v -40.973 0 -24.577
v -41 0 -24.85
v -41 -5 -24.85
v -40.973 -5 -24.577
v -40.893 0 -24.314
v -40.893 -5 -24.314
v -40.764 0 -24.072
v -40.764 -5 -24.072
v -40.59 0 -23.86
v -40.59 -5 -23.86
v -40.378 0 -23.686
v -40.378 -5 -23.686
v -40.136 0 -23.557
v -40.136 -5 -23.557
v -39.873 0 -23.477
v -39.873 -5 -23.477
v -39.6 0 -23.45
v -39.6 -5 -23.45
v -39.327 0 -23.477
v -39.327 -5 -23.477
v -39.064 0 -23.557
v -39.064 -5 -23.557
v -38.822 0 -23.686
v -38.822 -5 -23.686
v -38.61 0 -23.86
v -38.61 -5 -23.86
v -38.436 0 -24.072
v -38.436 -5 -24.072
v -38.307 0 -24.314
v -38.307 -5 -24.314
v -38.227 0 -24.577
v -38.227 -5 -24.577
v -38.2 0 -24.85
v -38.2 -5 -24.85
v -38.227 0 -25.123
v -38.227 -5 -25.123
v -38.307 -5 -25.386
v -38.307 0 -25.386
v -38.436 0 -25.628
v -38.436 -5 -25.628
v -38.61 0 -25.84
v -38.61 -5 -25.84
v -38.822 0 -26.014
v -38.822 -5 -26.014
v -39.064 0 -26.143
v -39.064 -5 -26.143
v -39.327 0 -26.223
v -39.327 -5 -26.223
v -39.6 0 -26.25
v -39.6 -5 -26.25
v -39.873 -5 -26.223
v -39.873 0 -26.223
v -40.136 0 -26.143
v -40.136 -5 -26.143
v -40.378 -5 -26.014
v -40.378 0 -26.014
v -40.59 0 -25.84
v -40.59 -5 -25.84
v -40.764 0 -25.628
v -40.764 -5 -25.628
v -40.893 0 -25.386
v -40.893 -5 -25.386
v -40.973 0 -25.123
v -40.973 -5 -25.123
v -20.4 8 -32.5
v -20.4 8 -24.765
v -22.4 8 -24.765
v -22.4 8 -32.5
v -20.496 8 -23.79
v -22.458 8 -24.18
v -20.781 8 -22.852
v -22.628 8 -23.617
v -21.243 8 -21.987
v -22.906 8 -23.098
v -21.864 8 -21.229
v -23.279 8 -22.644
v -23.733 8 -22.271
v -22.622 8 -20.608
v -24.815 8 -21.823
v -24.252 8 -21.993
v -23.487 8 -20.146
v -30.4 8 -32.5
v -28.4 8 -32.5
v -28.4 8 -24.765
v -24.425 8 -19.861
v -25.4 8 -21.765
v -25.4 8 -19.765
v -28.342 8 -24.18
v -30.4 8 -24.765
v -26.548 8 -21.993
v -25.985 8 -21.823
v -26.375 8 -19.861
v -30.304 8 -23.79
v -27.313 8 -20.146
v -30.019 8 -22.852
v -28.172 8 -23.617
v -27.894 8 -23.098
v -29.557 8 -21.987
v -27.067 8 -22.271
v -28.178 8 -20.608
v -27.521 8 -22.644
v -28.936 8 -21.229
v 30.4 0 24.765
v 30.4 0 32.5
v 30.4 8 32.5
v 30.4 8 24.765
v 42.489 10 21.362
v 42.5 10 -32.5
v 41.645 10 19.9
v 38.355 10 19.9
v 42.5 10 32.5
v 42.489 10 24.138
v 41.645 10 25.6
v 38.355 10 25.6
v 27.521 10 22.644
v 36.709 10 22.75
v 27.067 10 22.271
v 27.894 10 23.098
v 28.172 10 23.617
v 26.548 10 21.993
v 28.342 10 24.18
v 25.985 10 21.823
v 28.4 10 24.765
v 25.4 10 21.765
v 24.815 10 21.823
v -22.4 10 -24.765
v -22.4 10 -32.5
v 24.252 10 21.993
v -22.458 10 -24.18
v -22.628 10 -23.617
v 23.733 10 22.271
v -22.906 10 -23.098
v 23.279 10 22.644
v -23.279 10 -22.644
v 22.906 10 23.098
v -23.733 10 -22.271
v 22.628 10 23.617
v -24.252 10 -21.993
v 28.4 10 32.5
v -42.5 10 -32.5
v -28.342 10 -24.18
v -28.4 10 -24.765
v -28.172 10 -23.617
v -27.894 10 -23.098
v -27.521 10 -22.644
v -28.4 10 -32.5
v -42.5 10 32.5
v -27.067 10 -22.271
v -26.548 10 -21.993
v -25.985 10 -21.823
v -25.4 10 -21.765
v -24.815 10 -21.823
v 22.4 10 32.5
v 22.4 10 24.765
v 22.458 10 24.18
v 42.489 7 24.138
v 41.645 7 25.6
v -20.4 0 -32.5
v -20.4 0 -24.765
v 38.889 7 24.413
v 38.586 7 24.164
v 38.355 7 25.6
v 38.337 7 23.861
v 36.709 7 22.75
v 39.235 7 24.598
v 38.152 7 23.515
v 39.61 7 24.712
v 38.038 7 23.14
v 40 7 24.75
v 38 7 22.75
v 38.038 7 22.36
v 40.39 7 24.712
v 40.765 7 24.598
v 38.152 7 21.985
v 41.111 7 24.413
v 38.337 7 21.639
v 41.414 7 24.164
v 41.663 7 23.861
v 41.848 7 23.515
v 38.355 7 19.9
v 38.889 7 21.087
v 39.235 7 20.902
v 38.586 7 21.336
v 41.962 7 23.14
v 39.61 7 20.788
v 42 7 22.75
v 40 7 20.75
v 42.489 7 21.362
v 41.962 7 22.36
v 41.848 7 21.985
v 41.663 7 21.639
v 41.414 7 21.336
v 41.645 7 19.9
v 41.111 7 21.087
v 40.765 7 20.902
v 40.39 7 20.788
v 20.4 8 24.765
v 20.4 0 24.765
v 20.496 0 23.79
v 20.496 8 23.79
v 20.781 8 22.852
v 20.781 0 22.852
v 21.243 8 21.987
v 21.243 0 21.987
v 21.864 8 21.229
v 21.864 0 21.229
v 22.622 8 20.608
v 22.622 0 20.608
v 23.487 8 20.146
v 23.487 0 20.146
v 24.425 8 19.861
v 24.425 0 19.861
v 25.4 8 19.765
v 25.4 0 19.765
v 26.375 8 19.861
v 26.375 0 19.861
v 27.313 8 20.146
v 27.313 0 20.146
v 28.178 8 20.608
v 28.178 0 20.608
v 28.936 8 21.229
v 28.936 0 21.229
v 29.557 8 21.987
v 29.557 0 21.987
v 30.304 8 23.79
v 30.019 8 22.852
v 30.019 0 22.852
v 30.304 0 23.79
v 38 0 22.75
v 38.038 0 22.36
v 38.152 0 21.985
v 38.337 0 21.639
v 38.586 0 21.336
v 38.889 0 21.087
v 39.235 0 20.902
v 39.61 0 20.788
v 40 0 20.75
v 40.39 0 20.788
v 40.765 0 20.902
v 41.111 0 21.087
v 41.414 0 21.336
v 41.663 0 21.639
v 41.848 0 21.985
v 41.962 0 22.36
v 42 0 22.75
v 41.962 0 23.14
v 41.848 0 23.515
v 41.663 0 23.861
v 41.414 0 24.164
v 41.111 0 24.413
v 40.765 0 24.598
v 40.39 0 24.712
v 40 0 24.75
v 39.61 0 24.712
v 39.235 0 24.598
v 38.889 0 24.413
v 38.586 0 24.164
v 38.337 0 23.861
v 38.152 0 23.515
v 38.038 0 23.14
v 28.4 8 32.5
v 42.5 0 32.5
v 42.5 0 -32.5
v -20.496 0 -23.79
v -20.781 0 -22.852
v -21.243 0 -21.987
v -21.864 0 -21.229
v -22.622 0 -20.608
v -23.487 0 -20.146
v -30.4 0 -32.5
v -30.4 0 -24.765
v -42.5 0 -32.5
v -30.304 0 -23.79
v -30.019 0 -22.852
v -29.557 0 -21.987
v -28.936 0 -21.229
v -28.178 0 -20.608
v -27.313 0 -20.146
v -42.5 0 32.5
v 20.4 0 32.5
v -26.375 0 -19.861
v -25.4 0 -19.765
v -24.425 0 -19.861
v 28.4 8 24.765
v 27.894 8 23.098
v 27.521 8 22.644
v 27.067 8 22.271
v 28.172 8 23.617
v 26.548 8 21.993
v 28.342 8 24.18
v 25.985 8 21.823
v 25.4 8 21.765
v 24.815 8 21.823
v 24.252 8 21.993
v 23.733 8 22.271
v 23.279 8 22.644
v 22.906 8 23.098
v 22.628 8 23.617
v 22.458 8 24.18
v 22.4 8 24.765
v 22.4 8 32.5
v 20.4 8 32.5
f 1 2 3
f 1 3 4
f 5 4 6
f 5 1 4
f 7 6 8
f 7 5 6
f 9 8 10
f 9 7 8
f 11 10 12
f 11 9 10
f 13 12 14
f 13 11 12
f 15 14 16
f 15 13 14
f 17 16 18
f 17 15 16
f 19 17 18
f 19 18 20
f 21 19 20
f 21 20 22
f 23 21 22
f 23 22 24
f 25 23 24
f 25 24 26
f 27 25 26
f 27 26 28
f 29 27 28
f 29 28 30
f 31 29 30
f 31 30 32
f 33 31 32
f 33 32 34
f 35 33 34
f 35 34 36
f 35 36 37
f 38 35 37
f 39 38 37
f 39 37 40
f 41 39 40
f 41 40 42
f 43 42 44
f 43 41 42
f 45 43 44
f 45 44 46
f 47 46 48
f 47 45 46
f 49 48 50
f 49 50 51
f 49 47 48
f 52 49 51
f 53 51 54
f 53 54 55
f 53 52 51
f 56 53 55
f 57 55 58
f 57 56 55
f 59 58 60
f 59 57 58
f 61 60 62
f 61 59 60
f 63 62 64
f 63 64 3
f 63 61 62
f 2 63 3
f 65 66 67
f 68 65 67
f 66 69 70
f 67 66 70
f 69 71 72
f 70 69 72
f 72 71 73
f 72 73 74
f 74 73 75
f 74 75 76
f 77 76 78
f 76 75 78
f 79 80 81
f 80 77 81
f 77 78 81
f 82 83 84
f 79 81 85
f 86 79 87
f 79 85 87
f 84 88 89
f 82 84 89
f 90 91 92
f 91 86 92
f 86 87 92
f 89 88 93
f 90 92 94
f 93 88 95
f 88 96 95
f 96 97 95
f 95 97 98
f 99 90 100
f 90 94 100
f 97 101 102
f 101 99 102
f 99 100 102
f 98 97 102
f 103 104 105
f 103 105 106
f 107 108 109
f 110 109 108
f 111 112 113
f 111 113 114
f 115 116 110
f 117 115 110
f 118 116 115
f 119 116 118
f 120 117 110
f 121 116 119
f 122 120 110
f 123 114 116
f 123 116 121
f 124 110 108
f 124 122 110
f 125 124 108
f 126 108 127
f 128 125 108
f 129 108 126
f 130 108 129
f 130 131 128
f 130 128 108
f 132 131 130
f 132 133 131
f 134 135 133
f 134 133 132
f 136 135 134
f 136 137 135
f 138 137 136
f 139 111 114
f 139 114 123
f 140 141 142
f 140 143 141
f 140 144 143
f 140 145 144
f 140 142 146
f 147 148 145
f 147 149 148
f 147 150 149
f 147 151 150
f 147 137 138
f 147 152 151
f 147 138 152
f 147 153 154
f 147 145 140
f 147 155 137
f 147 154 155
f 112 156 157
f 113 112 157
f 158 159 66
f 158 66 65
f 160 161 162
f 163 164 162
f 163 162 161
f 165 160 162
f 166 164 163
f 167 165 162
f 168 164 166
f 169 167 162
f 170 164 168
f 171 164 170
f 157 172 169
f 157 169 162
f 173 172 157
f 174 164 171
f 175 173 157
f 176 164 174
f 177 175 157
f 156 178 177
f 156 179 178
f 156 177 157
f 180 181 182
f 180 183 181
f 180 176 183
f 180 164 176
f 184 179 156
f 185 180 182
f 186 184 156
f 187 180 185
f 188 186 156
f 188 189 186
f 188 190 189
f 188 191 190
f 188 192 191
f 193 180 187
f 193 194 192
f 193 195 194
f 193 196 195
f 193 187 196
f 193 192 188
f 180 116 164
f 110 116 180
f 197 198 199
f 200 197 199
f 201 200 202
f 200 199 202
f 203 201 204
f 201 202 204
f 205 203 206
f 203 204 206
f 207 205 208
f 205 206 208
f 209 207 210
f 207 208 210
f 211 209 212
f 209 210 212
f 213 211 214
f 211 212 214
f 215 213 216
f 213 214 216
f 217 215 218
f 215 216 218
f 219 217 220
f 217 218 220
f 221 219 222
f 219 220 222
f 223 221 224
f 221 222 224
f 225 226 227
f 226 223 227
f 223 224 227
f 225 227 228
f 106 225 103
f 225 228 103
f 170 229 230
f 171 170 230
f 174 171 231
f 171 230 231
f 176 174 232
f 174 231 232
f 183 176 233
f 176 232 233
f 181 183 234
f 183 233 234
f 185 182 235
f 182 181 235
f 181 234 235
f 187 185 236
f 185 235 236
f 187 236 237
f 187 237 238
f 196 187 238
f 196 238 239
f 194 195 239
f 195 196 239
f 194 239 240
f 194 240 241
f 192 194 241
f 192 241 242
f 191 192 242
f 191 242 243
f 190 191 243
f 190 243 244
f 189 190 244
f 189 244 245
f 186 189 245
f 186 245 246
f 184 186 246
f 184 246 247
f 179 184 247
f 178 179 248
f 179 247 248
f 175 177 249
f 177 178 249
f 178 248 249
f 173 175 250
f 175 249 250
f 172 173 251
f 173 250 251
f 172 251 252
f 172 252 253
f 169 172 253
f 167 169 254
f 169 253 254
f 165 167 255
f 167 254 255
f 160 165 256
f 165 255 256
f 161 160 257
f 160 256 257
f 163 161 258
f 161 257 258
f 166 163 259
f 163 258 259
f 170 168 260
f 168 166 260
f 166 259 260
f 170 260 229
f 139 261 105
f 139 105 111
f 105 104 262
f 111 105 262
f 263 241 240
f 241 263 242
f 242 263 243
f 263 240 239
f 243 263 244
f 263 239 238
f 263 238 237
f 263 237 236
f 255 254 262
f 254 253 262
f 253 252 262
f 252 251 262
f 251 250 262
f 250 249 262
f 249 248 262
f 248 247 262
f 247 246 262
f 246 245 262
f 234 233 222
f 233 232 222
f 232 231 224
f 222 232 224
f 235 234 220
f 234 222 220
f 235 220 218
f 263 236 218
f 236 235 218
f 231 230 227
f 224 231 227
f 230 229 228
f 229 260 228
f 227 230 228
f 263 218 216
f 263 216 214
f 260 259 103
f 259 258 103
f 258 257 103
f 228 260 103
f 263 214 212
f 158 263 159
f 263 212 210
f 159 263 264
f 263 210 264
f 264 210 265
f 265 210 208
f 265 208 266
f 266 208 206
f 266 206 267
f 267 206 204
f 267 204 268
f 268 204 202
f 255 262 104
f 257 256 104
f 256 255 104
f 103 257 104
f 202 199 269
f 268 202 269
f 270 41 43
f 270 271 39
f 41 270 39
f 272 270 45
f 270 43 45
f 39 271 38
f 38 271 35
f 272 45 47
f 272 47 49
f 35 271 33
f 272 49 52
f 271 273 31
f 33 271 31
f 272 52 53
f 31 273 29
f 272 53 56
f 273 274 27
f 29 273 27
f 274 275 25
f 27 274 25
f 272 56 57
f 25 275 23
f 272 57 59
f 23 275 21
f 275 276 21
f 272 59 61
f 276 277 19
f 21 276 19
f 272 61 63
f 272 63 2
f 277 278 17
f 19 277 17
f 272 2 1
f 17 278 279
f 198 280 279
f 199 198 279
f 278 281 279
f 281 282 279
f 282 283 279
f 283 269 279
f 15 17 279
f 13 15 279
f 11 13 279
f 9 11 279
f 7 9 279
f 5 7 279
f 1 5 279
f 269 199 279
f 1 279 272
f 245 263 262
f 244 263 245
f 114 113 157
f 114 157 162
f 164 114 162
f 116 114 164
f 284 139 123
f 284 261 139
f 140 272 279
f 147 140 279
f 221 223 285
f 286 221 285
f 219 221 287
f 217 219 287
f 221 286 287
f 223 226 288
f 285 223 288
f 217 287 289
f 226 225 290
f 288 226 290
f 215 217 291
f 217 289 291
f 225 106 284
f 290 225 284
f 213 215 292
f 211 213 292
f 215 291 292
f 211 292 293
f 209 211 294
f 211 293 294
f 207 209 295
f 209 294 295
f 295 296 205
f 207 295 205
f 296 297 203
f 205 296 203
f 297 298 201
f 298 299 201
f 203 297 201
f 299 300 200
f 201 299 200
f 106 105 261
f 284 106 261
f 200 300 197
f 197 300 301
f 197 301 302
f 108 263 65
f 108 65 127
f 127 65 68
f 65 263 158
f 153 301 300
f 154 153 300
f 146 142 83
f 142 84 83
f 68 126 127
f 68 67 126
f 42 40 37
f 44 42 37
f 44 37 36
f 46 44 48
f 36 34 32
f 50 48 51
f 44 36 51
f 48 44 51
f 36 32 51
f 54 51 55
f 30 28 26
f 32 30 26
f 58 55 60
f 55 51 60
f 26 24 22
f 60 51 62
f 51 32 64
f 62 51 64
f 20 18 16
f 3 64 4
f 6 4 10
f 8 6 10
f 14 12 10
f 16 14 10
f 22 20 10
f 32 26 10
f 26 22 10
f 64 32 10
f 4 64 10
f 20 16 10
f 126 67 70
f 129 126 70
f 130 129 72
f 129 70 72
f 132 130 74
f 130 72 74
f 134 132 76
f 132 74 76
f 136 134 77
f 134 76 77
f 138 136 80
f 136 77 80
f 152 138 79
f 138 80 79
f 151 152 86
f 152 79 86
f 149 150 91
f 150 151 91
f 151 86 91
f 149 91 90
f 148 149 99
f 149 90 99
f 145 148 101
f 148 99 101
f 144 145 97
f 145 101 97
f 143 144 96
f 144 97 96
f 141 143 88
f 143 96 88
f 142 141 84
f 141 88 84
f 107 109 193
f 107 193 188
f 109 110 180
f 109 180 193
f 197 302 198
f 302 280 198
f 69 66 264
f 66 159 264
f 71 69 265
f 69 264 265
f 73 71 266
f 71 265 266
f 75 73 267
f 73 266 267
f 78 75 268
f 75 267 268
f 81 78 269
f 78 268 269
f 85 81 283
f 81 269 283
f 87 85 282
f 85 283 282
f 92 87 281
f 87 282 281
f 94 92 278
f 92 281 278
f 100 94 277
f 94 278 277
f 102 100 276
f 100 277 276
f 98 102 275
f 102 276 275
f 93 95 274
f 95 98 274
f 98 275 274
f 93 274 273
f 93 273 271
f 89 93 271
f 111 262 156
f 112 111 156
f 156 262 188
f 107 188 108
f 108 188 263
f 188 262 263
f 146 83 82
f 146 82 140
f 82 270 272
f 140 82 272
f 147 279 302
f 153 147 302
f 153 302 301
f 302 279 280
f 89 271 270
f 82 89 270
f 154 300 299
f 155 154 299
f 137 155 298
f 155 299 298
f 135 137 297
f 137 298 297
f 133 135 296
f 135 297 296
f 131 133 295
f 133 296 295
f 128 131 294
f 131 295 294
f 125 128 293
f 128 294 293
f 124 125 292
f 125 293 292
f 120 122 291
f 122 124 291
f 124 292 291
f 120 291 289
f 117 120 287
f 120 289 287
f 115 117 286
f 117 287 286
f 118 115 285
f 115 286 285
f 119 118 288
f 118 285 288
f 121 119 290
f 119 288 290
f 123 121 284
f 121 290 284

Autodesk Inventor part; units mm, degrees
ref_plane "YZ Plane" through (0, 0, 0) normal (1, 0, 0) x (0, 1, 0)
ref_plane "XZ Plane" through (0, 0, 0) normal (0, 1, 0) x (-1, 0, 0)
ref_plane "XY Plane" through (0, 0, 0) normal (0, 0, 1) x (1, 0, 0)
sketch "Sketch1" plane through (0, 0, 0) normal (0, 1, 0) x (-1, 0, 0)
  line L0 (42.5, -32.5) -> (42.5, 32.5)
  line L1 (-42.5, 32.5) -> (-42.5, -32.5)
  line L2 (-42.5, -32.5) -> (42.5, 32.5) construction
  line L3 (42.5, -32.5) -> (-42.5, 32.5) construction
  line L4 (-25.4, -24.765) -> (25.4, -24.765) construction
  line L5 (25.4, -24.765) -> (25.4, 24.765) construction
  line L6 (25.4, 24.765) -> (-25.4, 24.765) construction
  line L7 (-25.4, 24.765) -> (-25.4, -24.765) construction
  line L8 (-25.4, -24.765) -> (25.4, 24.765) construction
  line L9 (25.4, -24.765) -> (-25.4, 24.765) construction
  arc A0 (-28.4, 24.765) -> (-22.4, 24.765) centre (-25.4, 24.765) ccw
  arc A1 (-30.4, 24.765) -> (-20.4, 24.765) centre (-25.4, 24.765) ccw
  arc A2 (28.4, -24.765) -> (22.4, -24.765) centre (25.4, -24.765) ccw
  arc A3 (30.4, -24.765) -> (20.4, -24.765) centre (25.4, -24.765) ccw
  line L10 (-20.4, 32.5) -> (-20.4, 24.765)
  line L11 (-30.4, 32.5) -> (-30.4, 24.765)
  line L12 (-28.4, 32.5) -> (-28.4, 24.765)
  line L13 (-22.4, 32.5) -> (-22.4, 24.765)
  line L14 (30.4, -24.765) -> (30.4, -32.5)
  line L15 (28.4, -24.765) -> (28.4, -32.5)
  line L16 (22.4, -24.765) -> (22.4, -32.5)
  line L17 (20.4, -24.765) -> (20.4, -32.5)
  line L18 (-42.5, -32.5) -> (22.4, -32.5)
  line L19 (28.4, -32.5) -> (42.5, -32.5)
  line L20 (42.5, 32.5) -> (-22.4, 32.5)
  line L21 (-28.4, 32.5) -> (-42.5, 32.5)
  point P0 (0, 0)
  dimension "d2" = 50.8
  dimension "d3" = 49.53
  dimension "d4" = 6
  dimension "d5" = 10
sketch "Sketch2" plane through (0, 0, 0) normal (0, 1, 0) x (-1, 0, 0)
  line L0 (-43, -29.25) -> (43, -29.25)
  line L1 (43, -29.25) -> (43, 29.25)
  line L2 (43, 29.25) -> (-43, 29.25)
  line L3 (-43, 29.25) -> (-43, -29.25)
  line L4 (-43, -29.25) -> (43, 29.25) construction
  line L5 (43, -29.25) -> (-43, 29.25) construction
  circle A0 centre (39.6, -24.85) radius 1.4
  line L6 (41, -24.85) -> (39.6, -24.85)
  line L7 (39.6, -24.85) -> (39.6, -26.25)
  circle A1 centre (-40, 22.75) radius 2
  line L8 (-38, 22.75) -> (-43, 22.75) construction
  line L9 (-40, 24.75) -> (-40, 29.25) construction
  line L10 (-40, 24.75) -> (-40, 22.75) construction
  point P0 (0, 0)
  dimension "d6" = 86
  dimension "d7" = 58.5
  dimension "d8" = 2.8
  dimension "d9" = 3
  dimension "d10" = 2
  dimension "d11" = 4
  dimension "d12" = 5
  dimension "d13" = 4.5
extrude "Extrusion1" add sketch "Sketch1" along normal blind 10
extrude "Extrusion2" cut sketch "Sketch1" along normal blind 8 contours L19 L15 A2 L16 L18 L17 A3 L14 | L10 A1 L11 L21 L12 A0 L13 L20
extrude "Extrusion3" add sketch "Sketch2" against normal blind 5 contours L6 L7 A0 | A0 L7 L6
extrude "Extrusion4" cut sketch "Sketch2" along normal through all contours A1
sketch "Sketch3" plane through (0, 10, 0) normal (0, 1, 0) x (1, 0, 0)
  circle A0 centre (40, -22.75) radius 2 projected
  arc A1 (-28.4, 24.765) -> (-22.4, 24.765) centre (-25.4, 24.765) ccw projected
  line L0 (-28.4, 24.765) -> (-28.4, 32.5) projected
  line L1 (-28.4, 32.5) -> (-42.5, 32.5) projected
  line L2 (-42.5, 32.5) -> (-42.5, -32.5) projected
  line L3 (-42.5, -32.5) -> (22.4, -32.5) projected
  line L4 (22.4, -32.5) -> (22.4, -24.765) projected
  arc A2 (28.4, -24.765) -> (22.4, -24.765) centre (25.4, -24.765) ccw projected
  line L5 (28.4, -24.765) -> (28.4, -32.5) projected
  line L6 (28.4, -32.5) -> (42.5, -32.5) projected
  line L7 (42.5, -32.5) -> (42.5, 32.5) projected
  line L8 (42.5, 32.5) -> (-22.4, 32.5) projected
  line L9 (-22.4, 32.5) -> (-22.4, 24.765) projected
  circle A3 centre (40, -22.75) radius 2.85
  line L10 (41.6454, -19.9) -> (43.2909, -22.75)
  line L11 (43.2909, -22.75) -> (41.6454, -25.6)
  line L12 (41.6454, -25.6) -> (38.3546, -25.6)
  line L13 (38.3546, -25.6) -> (36.7091, -22.75)
  line L14 (36.7091, -22.75) -> (38.3546, -19.9)
  line L15 (38.3546, -19.9) -> (41.6454, -19.9)
  point P0 (0, 0)
  point P1 (40, -19.9)
  dimension "d22" = 5.7
extrude "Extrusion5" cut sketch "Sketch3" against normal blind 3 contours A0 | A3 L7 | L10 L11 A3 | L7 A3 | A3 L15 L10 | L11 L12 A3 | A3 L14 L15 | L12 L13 A3 | A3 L13 L14
properties part number "base_fuentePoder_12v5a_3DPrint"
